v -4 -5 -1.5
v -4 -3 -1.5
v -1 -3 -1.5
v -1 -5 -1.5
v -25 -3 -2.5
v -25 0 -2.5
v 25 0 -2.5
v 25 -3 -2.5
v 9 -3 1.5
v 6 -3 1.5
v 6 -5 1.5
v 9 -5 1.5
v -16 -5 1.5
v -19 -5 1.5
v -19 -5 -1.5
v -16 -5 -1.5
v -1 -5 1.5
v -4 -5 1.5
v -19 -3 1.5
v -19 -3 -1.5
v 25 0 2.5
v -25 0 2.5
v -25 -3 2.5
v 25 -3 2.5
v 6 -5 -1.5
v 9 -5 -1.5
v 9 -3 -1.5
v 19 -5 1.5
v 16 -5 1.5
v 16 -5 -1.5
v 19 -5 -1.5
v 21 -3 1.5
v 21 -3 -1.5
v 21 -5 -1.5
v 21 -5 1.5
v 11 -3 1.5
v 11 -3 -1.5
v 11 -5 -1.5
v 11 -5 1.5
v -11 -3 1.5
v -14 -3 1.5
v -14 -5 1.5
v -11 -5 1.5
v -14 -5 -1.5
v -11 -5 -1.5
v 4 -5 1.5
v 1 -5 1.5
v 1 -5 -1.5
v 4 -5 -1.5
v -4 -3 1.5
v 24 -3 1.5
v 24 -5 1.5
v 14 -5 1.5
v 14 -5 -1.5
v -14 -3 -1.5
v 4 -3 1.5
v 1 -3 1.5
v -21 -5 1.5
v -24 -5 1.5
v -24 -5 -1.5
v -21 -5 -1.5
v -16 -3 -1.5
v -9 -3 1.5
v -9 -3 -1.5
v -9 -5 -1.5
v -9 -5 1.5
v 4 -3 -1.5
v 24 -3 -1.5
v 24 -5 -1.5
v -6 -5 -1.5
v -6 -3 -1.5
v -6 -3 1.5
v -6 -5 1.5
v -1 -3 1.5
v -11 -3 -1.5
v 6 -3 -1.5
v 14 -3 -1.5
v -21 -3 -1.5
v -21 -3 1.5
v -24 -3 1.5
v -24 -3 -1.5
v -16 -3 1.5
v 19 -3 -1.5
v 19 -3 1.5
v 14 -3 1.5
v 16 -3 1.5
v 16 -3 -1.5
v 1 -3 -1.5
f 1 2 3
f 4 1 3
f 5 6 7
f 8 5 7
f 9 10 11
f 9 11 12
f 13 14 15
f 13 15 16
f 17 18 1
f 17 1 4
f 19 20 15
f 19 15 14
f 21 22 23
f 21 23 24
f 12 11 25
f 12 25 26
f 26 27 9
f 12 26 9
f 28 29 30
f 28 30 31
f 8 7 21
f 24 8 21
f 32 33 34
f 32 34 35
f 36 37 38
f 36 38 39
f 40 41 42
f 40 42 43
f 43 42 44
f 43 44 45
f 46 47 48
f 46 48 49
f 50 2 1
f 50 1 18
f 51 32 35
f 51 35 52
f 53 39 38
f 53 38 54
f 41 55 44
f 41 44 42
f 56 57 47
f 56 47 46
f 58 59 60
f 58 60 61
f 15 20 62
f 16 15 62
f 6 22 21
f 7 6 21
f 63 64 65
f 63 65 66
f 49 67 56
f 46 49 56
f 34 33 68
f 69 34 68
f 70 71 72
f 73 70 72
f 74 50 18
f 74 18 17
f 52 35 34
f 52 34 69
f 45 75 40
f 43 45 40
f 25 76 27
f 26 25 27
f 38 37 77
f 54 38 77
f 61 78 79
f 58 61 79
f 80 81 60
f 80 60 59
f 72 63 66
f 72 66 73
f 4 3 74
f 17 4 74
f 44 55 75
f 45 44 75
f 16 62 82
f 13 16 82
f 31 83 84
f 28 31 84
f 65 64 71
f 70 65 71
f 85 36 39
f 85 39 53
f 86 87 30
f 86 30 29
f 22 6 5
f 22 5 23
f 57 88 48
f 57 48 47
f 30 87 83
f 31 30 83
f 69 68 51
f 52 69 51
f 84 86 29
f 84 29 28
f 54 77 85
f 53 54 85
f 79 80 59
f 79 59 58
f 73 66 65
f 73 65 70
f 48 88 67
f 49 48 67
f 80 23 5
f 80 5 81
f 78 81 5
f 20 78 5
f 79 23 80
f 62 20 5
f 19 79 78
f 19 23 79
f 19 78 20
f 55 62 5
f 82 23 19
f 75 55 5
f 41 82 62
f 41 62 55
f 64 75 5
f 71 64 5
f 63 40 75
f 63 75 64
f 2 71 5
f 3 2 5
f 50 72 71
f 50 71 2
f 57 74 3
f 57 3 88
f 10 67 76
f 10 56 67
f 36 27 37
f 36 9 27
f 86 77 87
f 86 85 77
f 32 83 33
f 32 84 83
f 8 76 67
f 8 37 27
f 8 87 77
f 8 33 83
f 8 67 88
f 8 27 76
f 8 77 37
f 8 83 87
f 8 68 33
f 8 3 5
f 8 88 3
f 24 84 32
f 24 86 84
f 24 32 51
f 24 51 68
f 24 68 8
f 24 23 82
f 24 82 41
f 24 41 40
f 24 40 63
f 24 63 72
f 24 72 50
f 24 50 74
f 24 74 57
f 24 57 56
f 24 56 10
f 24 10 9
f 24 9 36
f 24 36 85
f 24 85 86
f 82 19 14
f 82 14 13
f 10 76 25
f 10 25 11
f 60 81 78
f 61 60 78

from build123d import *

# Parameters (mm, degrees)
F0_W     = 50
F0_H     = 5
F1_DEPTH = 3
F2_W     = 3
F2_H     = 3
F3_DEPTH = 2


with BuildPart() as f1:
    # F0 (on Front) → F1 (new body)
    with BuildSketch(Plane.XZ):
        Rectangle(F0_W, F0_H)
    extrude(amount=F1_DEPTH)

    # F2 (on face) → F3 (join)
    with BuildSketch(Plane.XZ.offset(3)):
        with Locations((-22.5, 0)):
            Rectangle(F2_W, F2_H)
        with Locations((-17.5, 0)):
            Rectangle(F2_W, F2_H)
        with Locations((-12.5, 0)):
            Rectangle(F2_W, F2_H)
        with Locations((-7.5, 0)):
            Rectangle(F2_W, F2_H)
        with Locations((-2.5, 0)):
            Rectangle(F2_W, F2_H)
        with Locations((2.5, 0)):
            Rectangle(F2_W, F2_H)
        with Locations((7.5, 0)):
            Rectangle(F2_W, F2_H)
        with Locations((12.5, 0)):
            Rectangle(F2_W, F2_H)
        with Locations((17.5, 0)):
            Rectangle(F2_W, F2_H)
        with Locations((22.5, 0)):
            Rectangle(F2_W, F2_H)
    extrude(amount=F3_DEPTH)


solid = f1.part
